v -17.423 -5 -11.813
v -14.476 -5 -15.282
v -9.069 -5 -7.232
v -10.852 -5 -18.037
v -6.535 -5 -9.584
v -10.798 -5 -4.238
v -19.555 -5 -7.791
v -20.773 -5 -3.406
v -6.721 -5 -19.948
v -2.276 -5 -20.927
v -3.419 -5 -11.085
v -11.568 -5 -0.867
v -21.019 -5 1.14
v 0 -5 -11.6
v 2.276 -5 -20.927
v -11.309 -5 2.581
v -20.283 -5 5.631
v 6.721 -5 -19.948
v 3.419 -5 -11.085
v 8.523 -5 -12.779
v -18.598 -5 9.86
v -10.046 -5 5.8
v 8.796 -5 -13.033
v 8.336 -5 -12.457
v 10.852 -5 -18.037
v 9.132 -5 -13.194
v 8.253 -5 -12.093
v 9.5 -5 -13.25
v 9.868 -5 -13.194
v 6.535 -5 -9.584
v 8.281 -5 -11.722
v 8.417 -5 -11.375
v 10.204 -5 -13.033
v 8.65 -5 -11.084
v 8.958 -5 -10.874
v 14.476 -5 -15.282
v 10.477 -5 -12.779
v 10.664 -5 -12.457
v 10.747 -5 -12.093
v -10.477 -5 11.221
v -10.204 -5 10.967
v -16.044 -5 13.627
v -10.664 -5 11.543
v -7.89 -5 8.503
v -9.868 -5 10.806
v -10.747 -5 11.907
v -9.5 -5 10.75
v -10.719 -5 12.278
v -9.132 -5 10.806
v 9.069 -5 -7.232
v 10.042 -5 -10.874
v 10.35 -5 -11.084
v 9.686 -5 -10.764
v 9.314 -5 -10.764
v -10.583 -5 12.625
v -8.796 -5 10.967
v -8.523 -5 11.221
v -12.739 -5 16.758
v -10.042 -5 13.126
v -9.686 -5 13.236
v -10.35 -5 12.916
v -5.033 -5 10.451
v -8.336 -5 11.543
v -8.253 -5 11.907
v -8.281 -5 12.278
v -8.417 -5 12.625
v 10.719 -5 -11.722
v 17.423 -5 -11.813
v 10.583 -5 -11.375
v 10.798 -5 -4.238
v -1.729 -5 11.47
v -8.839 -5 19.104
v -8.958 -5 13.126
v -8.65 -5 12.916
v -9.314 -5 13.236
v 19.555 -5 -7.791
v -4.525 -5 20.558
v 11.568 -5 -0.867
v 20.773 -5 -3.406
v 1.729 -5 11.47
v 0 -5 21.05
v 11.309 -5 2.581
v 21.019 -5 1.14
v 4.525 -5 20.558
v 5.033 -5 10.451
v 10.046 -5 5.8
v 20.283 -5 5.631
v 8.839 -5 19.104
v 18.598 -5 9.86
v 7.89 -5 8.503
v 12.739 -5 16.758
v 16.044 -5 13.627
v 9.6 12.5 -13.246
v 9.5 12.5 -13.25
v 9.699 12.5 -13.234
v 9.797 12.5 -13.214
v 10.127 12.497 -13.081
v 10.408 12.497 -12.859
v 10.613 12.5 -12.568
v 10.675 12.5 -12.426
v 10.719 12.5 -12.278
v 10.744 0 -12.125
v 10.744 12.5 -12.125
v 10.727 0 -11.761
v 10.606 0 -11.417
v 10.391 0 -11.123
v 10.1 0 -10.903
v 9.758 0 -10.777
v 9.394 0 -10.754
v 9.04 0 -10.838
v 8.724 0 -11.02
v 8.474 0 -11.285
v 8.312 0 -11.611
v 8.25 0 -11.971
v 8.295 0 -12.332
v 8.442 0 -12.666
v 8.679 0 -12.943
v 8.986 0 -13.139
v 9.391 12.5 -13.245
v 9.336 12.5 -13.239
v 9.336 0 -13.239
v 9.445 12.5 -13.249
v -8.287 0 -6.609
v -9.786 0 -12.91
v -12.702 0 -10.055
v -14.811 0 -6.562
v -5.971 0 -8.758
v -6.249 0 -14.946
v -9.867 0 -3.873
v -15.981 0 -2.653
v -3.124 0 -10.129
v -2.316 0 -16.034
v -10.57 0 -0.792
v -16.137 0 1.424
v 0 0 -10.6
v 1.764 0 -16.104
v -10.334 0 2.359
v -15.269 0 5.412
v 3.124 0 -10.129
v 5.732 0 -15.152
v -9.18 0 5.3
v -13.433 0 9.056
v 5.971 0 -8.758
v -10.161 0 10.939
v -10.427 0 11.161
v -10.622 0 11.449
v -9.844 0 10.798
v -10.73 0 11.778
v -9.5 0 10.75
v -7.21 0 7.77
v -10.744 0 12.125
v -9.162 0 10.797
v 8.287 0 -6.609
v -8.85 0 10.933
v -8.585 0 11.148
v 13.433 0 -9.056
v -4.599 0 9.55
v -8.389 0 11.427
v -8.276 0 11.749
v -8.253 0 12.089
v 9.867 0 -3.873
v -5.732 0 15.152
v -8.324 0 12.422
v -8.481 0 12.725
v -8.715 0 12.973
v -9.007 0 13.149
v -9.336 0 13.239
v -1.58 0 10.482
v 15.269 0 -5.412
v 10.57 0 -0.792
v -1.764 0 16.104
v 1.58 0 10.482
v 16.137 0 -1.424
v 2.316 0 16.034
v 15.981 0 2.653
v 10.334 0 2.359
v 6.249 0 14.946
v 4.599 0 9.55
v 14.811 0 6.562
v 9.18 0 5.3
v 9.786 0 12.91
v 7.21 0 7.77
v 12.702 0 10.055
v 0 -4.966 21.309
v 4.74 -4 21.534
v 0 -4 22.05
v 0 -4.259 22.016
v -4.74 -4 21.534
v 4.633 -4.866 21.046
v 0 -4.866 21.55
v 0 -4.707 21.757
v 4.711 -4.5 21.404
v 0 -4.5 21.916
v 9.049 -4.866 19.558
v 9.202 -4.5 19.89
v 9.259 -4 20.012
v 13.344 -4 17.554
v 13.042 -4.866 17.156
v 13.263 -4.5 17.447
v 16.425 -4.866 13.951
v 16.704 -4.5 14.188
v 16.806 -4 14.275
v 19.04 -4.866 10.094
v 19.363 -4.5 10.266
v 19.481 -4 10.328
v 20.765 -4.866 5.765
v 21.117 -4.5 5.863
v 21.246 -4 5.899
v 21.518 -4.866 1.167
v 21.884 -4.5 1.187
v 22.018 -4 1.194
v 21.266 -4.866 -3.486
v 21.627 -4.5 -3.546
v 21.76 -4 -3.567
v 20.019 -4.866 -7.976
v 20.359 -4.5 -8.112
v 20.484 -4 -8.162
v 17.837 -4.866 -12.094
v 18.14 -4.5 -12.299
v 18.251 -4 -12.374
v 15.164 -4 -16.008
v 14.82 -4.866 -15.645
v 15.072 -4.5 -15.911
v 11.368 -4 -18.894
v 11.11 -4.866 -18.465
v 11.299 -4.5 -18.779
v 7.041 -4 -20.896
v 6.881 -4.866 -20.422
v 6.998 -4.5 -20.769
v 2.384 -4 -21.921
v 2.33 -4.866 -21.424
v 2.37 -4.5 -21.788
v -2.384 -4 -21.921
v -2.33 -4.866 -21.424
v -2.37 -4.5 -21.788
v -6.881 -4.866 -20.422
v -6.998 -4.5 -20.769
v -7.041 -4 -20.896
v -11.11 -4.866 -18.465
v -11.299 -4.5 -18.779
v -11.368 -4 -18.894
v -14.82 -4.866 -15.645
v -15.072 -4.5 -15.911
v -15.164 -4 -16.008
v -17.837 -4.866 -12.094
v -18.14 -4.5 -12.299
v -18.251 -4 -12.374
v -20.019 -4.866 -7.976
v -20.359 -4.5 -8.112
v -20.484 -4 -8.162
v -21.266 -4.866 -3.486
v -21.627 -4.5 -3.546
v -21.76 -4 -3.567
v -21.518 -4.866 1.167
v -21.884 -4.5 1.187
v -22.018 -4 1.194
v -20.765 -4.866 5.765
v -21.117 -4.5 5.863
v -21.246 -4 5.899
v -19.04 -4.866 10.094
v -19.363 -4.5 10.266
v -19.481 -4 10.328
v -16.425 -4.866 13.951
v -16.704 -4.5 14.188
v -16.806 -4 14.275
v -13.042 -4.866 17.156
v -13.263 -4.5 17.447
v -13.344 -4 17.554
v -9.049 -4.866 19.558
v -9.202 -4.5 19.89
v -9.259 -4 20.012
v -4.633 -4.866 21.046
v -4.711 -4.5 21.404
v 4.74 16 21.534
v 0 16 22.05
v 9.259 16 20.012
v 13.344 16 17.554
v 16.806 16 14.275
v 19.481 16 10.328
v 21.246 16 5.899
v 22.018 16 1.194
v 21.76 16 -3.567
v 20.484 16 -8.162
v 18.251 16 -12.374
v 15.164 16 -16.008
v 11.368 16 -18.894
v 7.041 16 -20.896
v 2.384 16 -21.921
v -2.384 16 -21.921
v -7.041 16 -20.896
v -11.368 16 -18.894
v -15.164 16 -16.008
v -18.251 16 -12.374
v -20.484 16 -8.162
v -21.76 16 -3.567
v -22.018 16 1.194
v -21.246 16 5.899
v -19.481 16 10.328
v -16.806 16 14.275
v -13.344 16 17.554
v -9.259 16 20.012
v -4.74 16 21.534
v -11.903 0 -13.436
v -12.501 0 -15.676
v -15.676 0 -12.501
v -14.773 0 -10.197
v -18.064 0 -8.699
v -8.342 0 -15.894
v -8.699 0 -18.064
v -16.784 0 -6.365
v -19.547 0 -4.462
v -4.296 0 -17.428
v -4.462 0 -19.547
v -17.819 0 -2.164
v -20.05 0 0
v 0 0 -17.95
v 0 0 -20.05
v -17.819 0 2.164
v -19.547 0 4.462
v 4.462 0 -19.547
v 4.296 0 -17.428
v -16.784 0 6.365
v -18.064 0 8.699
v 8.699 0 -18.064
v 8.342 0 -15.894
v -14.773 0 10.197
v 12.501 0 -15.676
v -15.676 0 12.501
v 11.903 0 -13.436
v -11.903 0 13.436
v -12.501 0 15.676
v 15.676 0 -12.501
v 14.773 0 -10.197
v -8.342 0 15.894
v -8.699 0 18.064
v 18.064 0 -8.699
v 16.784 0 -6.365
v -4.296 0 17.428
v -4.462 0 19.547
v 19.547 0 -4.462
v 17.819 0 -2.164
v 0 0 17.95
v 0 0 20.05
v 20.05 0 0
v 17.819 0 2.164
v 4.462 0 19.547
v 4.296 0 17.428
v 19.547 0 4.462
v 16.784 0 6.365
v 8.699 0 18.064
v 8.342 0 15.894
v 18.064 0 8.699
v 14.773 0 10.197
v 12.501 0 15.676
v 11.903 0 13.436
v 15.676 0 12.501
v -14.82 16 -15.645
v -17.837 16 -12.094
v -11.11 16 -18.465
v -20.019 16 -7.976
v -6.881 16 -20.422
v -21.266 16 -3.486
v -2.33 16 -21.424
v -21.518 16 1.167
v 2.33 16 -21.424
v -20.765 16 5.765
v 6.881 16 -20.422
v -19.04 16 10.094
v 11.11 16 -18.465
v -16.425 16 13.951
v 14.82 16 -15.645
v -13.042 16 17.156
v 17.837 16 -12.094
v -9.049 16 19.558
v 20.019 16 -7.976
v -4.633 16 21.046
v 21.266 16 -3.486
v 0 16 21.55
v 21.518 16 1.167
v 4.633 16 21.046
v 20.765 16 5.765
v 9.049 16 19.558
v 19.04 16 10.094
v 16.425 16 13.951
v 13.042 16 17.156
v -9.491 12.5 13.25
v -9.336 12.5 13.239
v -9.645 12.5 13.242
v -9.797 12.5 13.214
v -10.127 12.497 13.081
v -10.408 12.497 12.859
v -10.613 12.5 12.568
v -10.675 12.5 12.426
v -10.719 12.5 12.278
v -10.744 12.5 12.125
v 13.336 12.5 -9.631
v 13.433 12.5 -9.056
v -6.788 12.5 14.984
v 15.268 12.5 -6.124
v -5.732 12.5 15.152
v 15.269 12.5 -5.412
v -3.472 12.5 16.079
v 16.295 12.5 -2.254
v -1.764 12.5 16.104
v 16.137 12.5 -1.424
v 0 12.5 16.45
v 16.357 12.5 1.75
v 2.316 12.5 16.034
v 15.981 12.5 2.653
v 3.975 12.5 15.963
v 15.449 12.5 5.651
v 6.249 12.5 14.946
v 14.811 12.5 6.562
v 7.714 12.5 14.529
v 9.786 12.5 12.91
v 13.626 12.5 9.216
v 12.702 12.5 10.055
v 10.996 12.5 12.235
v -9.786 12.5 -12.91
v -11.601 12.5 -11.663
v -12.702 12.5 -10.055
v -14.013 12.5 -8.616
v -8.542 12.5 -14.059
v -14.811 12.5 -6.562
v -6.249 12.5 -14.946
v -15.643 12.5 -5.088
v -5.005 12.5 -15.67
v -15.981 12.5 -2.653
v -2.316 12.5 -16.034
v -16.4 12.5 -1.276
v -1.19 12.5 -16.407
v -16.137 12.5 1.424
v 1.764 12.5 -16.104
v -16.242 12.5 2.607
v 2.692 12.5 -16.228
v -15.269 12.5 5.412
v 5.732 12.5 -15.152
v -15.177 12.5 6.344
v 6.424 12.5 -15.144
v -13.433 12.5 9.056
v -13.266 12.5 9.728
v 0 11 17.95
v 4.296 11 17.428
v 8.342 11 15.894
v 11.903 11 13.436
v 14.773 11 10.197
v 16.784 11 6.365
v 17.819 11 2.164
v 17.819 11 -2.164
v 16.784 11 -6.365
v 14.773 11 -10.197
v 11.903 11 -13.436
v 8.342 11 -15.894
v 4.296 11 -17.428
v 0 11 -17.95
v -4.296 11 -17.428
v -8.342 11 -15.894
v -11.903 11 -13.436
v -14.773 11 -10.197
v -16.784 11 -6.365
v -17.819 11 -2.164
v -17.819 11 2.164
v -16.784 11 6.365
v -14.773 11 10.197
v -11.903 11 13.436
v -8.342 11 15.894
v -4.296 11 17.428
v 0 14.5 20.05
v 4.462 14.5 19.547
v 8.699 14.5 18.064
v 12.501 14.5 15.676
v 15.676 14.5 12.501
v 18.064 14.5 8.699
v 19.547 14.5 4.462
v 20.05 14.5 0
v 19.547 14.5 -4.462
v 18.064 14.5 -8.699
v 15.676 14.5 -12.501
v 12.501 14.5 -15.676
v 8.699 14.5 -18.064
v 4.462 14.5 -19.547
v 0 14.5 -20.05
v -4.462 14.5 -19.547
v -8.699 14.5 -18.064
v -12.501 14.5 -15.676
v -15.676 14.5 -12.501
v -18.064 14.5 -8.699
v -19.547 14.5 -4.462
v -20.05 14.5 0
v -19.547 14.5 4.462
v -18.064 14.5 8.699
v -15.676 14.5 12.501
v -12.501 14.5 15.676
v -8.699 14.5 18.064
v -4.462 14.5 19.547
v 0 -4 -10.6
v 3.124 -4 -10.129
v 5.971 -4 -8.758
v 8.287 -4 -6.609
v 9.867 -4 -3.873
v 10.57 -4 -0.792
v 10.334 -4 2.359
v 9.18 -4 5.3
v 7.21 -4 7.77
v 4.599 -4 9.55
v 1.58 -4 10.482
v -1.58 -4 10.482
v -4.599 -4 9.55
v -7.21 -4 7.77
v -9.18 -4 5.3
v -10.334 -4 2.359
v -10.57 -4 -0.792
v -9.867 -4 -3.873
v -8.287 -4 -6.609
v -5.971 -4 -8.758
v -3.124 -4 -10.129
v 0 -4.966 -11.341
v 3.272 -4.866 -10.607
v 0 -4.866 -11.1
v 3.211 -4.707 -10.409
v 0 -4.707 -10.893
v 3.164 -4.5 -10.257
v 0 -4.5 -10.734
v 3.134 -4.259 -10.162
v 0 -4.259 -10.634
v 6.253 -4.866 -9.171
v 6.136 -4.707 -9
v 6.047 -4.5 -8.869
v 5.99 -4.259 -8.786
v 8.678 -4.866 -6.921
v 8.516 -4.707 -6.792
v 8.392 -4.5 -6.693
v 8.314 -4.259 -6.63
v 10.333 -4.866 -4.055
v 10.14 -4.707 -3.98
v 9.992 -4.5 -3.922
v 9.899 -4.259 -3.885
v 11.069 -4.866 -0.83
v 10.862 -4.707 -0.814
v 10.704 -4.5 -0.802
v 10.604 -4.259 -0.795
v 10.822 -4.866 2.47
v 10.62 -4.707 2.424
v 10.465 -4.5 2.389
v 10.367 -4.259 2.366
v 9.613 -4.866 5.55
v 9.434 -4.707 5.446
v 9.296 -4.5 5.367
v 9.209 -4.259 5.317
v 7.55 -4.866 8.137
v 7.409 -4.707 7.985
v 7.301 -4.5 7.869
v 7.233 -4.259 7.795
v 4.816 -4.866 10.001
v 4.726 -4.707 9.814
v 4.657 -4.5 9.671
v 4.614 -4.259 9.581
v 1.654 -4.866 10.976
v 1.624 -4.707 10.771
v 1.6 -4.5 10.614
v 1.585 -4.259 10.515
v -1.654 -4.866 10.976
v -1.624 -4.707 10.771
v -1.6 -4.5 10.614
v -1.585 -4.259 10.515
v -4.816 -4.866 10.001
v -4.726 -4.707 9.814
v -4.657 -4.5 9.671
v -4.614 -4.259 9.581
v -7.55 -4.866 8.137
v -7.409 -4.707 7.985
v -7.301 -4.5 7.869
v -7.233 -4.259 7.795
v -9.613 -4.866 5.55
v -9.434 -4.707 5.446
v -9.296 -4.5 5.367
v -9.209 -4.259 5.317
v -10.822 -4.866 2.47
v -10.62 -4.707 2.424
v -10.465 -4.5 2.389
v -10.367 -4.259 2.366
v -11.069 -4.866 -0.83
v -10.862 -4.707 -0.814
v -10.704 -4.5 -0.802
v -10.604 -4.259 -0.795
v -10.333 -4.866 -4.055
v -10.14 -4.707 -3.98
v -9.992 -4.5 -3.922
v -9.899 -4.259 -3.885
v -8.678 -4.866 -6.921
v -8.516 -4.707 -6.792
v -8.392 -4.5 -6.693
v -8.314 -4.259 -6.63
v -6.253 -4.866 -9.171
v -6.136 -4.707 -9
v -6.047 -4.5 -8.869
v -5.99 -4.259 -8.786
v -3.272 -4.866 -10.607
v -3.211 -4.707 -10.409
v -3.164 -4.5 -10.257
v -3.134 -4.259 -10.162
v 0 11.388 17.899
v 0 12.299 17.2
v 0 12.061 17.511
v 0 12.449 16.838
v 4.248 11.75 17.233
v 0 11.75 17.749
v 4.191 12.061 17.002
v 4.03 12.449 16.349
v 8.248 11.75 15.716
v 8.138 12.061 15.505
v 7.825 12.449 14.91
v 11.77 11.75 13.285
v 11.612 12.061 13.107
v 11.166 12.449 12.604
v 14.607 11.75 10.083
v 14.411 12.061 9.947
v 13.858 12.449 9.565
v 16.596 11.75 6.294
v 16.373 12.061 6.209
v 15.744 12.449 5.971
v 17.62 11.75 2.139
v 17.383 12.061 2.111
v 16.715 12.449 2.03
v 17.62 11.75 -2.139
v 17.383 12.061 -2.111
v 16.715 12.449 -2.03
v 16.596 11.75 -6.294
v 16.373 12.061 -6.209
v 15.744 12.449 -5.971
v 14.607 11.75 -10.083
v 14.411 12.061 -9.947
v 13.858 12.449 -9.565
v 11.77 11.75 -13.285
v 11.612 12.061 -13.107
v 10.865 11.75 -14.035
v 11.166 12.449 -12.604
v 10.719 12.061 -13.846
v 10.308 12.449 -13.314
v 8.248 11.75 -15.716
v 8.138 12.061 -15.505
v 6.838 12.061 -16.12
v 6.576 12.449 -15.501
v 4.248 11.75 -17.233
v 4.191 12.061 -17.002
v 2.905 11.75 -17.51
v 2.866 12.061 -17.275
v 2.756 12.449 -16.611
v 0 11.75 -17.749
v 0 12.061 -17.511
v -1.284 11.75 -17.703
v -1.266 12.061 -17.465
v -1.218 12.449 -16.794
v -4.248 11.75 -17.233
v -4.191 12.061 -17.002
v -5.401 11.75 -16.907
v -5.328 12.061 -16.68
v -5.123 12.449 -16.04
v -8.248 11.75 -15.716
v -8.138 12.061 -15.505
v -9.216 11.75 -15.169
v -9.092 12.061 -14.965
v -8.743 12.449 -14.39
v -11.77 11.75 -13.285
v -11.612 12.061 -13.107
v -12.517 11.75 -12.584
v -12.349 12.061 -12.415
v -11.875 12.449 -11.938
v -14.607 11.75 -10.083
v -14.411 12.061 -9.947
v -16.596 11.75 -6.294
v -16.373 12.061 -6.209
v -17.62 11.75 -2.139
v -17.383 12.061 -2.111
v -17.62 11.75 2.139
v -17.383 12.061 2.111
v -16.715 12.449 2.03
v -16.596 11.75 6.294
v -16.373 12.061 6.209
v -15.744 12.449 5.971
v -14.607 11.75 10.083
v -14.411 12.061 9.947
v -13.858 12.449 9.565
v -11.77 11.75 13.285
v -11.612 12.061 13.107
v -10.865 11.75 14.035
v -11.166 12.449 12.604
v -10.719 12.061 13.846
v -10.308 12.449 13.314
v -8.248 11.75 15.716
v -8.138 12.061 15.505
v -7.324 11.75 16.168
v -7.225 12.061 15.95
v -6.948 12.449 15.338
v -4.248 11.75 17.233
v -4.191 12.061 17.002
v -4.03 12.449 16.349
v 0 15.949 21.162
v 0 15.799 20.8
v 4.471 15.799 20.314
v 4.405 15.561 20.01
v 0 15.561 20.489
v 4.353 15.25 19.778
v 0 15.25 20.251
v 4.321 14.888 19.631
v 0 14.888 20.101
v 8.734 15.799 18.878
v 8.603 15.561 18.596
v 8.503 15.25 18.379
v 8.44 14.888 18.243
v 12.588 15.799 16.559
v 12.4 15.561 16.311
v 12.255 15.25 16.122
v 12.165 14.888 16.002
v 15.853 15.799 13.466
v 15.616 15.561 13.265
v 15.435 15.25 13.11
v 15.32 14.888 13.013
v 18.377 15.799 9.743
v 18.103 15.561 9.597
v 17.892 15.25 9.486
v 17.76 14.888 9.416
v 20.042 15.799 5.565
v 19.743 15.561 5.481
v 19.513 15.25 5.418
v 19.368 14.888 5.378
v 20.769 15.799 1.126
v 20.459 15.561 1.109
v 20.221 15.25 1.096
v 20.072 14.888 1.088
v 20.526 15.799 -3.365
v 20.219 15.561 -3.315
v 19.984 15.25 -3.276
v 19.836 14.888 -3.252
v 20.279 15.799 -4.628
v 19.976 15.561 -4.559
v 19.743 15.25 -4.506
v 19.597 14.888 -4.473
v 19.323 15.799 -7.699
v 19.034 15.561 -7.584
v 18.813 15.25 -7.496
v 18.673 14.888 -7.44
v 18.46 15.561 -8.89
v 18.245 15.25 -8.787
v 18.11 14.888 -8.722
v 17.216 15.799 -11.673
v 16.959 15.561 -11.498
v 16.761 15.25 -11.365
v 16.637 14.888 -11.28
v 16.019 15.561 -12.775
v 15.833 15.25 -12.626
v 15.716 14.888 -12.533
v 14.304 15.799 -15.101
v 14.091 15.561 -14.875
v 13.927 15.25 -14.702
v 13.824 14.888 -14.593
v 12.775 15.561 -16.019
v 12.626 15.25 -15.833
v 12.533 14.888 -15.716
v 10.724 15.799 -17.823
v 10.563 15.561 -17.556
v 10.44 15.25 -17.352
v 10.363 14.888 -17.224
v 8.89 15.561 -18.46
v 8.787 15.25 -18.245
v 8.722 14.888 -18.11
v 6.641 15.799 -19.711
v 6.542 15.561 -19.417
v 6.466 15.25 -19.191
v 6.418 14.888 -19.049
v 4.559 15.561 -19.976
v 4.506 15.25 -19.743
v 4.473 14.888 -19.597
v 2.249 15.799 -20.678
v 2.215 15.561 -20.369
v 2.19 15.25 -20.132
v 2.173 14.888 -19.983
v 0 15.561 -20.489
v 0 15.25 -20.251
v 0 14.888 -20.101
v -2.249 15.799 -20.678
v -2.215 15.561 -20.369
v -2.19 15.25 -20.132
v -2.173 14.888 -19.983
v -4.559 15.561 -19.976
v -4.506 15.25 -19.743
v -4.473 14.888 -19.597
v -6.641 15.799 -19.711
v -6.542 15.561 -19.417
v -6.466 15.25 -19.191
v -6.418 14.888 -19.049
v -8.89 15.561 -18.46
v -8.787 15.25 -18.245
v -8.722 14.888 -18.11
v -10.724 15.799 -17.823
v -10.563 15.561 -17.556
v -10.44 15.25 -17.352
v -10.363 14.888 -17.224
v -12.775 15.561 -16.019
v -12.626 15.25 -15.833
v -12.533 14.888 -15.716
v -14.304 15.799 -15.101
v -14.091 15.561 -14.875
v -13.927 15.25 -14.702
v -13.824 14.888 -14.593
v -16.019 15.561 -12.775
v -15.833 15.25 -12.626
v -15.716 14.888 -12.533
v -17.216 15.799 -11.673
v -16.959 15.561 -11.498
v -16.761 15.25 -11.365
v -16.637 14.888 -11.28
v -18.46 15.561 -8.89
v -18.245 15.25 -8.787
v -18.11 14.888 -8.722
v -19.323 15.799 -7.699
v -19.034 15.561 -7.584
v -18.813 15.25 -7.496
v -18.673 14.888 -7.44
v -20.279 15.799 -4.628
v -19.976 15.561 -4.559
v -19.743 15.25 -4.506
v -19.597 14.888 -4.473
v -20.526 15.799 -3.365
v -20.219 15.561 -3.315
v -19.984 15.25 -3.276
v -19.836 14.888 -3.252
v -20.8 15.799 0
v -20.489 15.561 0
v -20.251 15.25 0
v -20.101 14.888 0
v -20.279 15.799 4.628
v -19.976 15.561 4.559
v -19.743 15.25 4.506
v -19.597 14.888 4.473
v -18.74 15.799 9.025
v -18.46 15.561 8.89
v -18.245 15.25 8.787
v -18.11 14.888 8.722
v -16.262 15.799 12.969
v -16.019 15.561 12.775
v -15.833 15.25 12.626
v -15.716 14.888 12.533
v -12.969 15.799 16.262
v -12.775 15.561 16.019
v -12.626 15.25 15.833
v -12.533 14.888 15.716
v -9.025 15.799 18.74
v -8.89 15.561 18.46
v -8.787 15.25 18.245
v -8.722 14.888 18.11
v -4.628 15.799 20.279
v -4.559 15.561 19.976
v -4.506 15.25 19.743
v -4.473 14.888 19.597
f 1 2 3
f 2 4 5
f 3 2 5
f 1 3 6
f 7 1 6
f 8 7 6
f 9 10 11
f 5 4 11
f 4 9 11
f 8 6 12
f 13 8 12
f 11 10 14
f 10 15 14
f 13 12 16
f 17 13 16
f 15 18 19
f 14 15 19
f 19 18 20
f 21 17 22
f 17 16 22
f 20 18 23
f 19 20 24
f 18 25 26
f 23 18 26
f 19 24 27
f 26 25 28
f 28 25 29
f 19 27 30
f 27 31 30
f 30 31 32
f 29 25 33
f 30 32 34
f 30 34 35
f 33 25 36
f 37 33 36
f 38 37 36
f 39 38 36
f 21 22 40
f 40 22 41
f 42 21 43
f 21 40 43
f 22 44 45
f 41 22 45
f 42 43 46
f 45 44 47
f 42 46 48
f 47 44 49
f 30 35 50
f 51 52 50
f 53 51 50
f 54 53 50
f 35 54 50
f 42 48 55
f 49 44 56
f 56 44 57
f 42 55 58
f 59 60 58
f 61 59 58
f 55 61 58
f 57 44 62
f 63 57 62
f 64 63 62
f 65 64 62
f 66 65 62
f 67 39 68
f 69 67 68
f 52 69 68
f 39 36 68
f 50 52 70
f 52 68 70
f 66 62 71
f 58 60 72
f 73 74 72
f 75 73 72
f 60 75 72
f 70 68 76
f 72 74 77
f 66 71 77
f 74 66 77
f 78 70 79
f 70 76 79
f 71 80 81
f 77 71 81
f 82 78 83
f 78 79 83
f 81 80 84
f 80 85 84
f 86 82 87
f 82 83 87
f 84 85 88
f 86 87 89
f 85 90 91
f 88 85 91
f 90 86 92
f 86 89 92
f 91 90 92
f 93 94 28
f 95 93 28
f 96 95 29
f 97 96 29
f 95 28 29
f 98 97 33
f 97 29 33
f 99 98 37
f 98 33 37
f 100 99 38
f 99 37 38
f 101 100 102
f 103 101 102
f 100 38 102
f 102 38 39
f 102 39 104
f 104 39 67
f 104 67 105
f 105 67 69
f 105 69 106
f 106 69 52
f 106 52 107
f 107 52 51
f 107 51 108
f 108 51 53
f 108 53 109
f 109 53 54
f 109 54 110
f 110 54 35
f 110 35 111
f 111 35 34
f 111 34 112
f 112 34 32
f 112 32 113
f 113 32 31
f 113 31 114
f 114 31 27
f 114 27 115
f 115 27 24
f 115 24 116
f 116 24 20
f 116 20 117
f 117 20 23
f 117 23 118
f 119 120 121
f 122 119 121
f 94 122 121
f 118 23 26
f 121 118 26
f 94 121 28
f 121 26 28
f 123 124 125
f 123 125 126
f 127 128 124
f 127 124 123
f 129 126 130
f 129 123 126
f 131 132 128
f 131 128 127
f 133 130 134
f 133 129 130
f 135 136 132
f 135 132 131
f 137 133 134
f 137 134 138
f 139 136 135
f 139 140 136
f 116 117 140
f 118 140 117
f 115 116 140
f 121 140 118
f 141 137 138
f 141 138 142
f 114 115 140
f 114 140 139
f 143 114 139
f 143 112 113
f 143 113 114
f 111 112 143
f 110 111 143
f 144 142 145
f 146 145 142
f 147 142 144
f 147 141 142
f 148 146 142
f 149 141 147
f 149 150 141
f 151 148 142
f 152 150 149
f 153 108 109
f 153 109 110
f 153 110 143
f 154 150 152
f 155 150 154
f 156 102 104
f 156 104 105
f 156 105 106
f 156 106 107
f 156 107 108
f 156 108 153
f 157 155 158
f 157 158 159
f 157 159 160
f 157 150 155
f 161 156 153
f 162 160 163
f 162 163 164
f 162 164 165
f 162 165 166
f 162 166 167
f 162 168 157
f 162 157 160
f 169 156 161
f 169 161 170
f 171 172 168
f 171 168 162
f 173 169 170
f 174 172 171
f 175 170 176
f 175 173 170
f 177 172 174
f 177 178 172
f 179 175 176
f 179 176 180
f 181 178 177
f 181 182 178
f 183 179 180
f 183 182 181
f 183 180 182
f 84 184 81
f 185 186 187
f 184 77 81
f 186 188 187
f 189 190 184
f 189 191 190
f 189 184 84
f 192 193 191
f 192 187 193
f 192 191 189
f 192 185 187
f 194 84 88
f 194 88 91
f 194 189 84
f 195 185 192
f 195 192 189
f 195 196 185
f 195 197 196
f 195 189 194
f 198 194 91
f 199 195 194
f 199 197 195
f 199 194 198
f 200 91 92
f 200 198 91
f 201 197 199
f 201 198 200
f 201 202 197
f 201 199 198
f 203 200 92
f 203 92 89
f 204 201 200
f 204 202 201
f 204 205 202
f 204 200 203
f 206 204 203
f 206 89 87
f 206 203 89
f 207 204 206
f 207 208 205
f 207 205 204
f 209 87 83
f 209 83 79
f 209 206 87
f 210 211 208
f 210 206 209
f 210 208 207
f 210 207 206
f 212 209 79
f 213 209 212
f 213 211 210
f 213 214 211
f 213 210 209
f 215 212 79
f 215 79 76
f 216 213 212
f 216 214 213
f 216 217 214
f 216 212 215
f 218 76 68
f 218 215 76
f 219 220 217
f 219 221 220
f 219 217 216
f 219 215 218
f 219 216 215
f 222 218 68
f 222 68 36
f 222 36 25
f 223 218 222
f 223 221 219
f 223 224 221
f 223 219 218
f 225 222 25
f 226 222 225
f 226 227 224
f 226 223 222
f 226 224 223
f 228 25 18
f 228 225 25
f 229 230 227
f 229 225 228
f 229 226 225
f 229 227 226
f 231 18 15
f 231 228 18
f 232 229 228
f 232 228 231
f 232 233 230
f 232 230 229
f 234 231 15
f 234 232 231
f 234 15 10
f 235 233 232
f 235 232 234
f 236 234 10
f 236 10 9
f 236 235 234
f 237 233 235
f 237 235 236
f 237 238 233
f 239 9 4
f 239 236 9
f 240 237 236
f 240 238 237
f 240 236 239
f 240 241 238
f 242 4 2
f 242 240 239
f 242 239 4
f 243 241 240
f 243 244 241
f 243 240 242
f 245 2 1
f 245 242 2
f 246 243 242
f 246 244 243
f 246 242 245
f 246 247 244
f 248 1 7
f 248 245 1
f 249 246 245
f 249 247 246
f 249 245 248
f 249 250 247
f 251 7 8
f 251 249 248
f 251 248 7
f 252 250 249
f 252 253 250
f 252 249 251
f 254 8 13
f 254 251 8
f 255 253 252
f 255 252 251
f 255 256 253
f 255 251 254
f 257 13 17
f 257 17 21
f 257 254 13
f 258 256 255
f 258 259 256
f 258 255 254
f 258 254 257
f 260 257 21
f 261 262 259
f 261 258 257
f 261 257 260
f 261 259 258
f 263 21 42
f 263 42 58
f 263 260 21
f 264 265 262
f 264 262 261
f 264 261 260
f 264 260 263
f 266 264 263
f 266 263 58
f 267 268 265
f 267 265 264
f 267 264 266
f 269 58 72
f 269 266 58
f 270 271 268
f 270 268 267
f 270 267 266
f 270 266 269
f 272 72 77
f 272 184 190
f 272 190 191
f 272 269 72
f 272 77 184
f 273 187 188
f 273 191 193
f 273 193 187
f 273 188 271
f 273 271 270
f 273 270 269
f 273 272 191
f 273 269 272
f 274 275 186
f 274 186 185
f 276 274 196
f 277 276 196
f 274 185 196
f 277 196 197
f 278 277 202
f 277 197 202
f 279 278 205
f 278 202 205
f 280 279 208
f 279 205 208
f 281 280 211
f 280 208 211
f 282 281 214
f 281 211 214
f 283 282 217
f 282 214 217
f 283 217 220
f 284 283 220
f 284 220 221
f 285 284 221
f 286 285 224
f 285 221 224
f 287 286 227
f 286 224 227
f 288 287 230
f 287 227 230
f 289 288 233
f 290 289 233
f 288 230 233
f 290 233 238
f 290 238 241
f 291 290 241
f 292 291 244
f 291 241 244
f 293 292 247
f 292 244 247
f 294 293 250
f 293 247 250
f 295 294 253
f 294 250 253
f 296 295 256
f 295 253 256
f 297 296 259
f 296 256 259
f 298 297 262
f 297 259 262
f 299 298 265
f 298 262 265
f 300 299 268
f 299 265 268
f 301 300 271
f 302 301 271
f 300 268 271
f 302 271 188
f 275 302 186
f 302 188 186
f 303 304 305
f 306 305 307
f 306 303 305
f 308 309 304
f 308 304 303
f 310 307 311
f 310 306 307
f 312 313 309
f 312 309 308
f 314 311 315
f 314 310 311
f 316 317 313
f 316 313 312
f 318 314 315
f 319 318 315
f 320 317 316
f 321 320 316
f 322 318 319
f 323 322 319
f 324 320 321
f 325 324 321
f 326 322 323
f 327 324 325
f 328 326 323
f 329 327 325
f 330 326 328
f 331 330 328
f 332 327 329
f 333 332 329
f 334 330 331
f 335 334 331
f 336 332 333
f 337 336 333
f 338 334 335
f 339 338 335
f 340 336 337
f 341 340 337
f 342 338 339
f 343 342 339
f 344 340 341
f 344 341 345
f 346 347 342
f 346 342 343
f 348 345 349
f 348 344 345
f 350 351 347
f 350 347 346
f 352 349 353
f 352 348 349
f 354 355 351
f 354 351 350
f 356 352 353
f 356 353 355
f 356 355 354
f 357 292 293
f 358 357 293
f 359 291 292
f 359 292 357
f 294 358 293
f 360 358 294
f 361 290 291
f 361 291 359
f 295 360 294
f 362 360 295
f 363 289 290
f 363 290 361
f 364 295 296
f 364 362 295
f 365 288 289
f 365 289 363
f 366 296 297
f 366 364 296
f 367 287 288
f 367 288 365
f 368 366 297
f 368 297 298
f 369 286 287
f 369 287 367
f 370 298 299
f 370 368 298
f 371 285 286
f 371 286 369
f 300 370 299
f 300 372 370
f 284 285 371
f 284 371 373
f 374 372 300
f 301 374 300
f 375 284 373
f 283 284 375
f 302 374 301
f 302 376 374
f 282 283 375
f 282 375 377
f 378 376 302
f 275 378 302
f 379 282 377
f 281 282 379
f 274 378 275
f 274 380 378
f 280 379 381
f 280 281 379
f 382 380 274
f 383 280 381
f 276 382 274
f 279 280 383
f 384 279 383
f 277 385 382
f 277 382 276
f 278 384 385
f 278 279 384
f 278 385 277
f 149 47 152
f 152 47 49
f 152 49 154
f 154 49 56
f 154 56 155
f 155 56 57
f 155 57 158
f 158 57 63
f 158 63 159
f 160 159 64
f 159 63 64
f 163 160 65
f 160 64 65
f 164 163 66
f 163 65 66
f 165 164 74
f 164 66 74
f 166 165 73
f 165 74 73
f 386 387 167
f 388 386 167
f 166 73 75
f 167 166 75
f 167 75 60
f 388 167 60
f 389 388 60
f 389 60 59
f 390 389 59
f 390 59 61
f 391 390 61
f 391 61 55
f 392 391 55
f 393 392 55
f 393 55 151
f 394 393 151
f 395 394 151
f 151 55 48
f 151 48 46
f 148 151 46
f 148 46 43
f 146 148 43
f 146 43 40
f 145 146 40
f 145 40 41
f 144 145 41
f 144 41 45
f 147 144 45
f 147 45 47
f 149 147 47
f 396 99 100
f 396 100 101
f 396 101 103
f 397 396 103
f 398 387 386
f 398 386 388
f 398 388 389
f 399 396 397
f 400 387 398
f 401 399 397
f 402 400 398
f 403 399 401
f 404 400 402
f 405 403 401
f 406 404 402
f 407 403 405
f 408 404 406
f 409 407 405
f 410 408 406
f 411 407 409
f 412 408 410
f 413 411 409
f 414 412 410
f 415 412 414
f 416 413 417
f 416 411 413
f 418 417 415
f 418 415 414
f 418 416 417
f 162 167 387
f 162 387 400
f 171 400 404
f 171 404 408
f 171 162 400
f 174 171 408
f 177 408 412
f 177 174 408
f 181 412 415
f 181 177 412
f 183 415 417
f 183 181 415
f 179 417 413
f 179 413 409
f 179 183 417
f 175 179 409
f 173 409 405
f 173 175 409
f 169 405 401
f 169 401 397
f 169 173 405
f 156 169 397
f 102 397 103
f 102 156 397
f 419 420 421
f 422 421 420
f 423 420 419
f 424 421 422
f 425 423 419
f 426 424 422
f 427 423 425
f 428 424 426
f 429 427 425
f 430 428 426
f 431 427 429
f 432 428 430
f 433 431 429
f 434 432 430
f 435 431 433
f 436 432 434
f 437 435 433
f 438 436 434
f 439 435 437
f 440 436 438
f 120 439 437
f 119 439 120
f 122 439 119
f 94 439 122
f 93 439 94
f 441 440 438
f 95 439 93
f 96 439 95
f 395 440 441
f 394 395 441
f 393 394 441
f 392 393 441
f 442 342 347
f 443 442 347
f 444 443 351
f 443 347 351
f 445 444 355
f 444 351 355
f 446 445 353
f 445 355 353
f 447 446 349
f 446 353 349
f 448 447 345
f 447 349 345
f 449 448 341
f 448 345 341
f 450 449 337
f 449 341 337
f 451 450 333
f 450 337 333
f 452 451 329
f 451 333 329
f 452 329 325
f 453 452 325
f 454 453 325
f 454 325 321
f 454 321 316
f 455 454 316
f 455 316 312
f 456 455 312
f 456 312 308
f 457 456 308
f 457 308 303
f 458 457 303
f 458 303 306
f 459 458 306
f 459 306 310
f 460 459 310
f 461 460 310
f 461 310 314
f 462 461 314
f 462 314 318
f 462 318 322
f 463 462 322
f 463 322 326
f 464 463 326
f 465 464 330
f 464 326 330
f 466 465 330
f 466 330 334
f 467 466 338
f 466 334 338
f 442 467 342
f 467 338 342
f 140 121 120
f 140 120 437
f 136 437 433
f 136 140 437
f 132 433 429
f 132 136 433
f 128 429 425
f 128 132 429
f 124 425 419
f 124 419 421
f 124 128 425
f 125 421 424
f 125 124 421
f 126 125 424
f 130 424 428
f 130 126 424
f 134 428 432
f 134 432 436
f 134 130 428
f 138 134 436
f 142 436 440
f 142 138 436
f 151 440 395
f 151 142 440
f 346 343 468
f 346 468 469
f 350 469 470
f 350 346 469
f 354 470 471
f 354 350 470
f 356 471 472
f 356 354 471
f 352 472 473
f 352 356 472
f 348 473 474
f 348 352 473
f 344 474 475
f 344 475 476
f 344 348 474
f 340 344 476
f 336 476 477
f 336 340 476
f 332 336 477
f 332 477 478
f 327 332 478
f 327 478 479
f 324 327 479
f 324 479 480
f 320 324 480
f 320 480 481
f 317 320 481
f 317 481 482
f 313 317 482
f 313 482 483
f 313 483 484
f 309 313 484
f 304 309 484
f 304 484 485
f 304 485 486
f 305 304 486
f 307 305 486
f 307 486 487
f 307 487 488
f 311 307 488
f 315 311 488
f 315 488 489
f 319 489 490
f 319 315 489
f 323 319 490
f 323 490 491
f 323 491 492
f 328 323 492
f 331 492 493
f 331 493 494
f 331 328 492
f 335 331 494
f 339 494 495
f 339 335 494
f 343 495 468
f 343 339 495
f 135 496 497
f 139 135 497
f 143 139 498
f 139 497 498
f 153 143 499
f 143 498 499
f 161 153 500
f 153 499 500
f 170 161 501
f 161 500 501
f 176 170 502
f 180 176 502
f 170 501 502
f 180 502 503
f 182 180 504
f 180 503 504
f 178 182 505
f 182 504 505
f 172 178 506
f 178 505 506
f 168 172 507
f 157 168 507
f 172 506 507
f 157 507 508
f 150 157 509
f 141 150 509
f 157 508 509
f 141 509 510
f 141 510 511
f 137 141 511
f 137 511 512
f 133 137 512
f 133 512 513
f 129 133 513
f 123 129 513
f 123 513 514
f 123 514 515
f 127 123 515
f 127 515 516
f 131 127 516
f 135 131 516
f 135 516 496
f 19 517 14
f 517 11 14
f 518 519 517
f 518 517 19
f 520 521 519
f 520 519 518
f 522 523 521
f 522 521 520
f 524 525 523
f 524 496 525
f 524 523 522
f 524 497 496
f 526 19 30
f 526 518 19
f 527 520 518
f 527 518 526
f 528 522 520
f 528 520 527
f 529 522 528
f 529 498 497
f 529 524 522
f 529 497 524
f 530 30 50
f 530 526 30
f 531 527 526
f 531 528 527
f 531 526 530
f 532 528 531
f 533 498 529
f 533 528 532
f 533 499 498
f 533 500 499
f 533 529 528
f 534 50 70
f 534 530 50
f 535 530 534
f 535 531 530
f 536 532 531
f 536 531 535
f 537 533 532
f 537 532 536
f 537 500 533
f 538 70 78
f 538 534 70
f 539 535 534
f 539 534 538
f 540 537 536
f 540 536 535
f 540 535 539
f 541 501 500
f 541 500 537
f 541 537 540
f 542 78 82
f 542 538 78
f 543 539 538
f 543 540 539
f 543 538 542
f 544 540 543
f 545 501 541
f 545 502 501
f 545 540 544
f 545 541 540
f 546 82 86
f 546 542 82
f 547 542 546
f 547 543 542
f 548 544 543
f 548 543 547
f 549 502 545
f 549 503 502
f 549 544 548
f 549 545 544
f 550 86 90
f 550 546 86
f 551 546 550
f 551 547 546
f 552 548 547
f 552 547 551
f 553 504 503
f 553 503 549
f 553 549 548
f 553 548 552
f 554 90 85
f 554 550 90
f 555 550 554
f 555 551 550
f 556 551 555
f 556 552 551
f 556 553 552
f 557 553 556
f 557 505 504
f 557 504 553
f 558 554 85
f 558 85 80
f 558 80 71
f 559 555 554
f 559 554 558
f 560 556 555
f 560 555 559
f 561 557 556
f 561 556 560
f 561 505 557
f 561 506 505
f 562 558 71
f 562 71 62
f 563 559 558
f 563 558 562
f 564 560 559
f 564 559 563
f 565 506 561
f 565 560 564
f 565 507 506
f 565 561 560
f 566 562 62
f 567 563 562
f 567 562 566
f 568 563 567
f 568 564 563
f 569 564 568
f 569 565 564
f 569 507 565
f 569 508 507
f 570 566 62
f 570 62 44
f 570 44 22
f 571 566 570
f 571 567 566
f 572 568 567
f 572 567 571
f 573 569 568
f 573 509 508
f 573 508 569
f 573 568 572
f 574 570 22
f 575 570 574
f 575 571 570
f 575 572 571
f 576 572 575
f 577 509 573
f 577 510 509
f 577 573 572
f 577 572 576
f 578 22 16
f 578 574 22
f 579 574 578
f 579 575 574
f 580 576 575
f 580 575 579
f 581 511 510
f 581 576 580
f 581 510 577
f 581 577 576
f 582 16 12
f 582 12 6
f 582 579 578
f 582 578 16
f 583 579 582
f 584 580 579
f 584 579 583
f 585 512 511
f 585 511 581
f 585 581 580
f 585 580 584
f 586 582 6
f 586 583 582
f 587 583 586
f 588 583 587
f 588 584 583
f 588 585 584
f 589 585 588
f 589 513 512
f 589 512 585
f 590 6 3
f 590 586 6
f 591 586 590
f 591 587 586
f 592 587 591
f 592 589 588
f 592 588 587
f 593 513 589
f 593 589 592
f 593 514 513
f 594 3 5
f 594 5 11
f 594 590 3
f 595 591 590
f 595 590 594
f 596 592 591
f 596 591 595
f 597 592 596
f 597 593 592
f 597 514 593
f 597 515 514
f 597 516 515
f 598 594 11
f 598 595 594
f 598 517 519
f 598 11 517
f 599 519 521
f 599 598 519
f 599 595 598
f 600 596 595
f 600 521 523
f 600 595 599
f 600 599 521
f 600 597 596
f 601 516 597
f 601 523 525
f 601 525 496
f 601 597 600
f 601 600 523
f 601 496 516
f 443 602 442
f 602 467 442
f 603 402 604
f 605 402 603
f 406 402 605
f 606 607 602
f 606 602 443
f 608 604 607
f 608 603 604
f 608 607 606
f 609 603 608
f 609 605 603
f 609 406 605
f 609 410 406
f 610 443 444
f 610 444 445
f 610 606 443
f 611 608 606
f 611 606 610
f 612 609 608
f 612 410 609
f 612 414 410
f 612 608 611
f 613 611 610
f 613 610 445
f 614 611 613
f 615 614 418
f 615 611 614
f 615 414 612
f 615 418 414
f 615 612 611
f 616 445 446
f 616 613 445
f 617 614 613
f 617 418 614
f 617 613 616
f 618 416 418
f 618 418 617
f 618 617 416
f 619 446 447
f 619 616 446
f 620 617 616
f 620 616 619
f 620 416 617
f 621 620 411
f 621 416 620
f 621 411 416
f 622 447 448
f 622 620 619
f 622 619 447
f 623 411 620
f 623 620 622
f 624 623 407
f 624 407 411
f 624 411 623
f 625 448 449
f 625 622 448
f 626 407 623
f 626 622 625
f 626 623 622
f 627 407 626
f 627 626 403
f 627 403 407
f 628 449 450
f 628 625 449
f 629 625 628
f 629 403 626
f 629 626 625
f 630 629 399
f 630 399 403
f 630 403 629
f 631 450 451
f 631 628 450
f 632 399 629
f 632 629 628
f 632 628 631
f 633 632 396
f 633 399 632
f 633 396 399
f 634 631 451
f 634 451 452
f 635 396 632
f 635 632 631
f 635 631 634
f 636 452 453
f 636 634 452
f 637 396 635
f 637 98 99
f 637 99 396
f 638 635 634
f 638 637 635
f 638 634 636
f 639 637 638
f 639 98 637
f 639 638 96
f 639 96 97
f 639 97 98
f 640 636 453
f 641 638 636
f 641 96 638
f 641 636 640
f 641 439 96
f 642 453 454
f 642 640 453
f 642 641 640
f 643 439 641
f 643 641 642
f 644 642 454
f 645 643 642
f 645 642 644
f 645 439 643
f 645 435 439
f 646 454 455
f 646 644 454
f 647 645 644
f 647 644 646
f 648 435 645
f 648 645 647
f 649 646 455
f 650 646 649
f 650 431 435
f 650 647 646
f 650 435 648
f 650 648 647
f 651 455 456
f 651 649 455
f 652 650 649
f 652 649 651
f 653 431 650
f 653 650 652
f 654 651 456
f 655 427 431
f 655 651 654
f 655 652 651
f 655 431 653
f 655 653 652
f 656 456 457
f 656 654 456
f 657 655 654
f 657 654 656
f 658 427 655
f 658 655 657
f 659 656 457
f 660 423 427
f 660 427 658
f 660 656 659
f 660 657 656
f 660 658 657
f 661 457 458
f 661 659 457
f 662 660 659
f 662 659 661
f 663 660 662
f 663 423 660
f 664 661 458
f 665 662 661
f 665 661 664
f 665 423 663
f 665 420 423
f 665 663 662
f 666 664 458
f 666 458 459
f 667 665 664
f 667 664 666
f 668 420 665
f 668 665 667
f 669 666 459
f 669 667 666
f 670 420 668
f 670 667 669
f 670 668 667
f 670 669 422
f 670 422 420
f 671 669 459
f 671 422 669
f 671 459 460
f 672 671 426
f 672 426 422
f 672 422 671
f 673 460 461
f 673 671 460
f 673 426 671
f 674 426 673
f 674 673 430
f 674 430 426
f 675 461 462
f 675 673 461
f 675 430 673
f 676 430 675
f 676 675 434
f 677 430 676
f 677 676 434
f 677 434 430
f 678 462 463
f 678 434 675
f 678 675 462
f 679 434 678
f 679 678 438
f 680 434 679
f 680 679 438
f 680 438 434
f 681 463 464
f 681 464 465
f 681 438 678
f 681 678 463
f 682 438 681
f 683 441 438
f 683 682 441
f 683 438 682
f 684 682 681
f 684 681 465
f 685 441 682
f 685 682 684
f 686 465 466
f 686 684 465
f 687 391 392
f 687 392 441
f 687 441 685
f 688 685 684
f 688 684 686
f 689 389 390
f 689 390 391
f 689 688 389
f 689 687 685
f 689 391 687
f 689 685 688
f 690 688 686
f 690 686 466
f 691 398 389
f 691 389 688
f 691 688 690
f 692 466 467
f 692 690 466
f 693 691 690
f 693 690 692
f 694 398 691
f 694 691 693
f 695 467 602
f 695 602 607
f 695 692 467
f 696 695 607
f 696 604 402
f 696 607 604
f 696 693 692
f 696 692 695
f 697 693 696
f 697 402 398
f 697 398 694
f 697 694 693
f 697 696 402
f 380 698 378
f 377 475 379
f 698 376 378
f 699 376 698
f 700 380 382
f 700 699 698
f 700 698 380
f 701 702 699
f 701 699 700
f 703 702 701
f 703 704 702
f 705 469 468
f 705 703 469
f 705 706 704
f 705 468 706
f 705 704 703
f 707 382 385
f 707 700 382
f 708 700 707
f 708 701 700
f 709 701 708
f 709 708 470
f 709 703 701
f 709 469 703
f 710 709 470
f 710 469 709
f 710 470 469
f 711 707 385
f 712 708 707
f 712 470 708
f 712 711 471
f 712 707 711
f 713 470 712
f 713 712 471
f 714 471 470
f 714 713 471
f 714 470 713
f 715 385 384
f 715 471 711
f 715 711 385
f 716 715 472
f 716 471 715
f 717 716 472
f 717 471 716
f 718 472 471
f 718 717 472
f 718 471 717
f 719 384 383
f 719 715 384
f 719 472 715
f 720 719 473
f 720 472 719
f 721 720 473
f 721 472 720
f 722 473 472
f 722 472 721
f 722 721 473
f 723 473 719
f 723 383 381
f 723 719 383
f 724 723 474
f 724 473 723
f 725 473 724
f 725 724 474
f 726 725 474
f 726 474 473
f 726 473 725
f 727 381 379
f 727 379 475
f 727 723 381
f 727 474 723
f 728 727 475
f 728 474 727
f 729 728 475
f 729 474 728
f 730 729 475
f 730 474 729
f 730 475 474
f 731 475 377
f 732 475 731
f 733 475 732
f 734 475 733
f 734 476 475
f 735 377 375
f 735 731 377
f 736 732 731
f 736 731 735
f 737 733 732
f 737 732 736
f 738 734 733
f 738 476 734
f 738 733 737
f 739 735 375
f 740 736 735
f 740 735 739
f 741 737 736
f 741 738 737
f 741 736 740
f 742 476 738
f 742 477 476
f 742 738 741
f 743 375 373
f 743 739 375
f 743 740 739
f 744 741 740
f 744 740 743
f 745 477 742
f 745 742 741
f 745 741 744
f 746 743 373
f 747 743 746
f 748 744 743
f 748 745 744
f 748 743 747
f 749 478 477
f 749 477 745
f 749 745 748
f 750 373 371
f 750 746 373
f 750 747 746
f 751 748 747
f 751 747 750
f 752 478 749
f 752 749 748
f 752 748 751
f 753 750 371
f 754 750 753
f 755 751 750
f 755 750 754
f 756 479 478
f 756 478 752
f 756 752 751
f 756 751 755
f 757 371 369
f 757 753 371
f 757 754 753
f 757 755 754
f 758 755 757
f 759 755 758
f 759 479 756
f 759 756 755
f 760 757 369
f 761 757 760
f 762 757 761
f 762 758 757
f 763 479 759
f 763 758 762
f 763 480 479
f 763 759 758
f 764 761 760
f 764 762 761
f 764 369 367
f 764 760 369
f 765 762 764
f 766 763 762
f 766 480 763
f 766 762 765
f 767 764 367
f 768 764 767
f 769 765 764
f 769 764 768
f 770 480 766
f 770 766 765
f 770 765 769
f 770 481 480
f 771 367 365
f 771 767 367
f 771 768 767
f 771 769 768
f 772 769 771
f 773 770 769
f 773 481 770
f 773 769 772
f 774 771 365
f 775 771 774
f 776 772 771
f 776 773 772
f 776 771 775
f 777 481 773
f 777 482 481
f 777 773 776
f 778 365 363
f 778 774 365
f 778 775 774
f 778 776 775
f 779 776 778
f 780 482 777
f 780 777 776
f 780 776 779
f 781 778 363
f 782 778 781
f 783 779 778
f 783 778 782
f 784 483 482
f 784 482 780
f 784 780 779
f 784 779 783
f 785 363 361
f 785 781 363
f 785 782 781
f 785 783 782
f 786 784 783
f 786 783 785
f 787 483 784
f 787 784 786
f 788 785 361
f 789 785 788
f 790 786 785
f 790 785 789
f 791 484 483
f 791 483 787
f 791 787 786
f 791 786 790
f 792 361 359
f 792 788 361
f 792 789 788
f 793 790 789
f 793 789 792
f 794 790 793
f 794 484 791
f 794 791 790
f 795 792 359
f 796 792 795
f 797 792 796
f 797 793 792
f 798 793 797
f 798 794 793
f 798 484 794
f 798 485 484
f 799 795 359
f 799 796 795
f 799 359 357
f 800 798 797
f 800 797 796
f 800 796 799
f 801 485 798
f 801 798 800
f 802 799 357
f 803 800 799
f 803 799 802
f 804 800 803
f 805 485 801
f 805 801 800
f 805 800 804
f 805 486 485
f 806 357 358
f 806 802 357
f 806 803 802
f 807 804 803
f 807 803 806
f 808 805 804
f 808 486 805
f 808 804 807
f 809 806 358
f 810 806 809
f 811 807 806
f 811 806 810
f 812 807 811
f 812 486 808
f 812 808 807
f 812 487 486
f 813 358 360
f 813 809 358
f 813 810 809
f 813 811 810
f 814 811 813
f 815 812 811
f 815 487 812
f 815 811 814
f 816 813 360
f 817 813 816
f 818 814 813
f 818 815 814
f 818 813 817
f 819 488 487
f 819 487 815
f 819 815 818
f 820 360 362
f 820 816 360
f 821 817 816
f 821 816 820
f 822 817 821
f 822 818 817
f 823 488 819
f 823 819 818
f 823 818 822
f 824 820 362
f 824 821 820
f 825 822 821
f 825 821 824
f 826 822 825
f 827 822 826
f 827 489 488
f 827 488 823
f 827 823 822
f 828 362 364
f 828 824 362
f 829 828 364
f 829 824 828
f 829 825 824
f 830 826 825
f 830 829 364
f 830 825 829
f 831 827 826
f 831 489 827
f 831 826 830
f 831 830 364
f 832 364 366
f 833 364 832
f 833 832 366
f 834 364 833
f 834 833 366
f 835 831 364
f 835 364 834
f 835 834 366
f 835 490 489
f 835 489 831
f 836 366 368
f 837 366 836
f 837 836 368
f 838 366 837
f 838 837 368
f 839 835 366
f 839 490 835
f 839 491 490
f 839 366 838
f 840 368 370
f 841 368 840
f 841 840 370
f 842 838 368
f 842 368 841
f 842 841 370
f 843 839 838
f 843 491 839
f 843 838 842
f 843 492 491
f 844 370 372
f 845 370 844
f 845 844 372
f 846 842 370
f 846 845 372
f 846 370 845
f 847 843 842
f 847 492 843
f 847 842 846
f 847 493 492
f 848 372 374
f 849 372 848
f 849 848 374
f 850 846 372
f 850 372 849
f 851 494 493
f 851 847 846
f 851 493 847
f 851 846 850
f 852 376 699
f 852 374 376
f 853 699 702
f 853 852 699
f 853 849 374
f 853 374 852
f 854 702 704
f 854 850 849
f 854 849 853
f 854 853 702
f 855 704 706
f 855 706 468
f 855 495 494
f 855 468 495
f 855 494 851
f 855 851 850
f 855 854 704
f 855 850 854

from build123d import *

# Parameters (mm, degrees)
CROQUIS1_R              = 22.05
CROQUIS1_R_2            = 20.05
SALIENTE_EXTRUIR1_DEPTH = 16
CROQUIS1_4_R            = 17.95
CROQUIS1_4_R_2          = 16.2
SALIENTE_EXTRUIR2_DEPTH = 12.5
SALIENTE_EXTRUIR4_START = -5
CROQUIS1_6_R            = 22.05
CROQUIS1_6_R_2          = 20.05
CROQUIS1_6_R_3          = 17.95
CROQUIS1_6_R_4          = 16.2
SALIENTE_EXTRUIR4_DEPTH = 5
CORTAR_EXTRUIR1_REACH   = 39.595
CROQUIS4_R              = 10.6
CROQUIS4_R_2            = 1.25
REDONDEO1_R             = 1
REDONDEO2_R             = 1.5
REDONDEO3_R             = 1


with BuildPart() as part:
    # Croquis1 → Saliente-Extruir1 (new body)
    with BuildSketch(Plane(origin=(0, 0, 0), x_dir=(1, 0, 0), z_dir=(0, 1, 0))):
        with Locations(Location((0, 0, 0), (0, 0, 270))):
            Circle(CROQUIS1_R)
        with Locations(Location((0, 0, 0), (0, 0, 270))):
            Circle(CROQUIS1_R_2, mode=Mode.SUBTRACT)
    extrude(amount=SALIENTE_EXTRUIR1_DEPTH)



with BuildPart() as body_2:
    # Croquis1<4> → Saliente-Extruir2 (new body)
    with BuildSketch(Plane(origin=(0, 0, 0), x_dir=(1, 0, 0), z_dir=(0, 1, 0))):
        with Locations(Location((0, 0, 0), (0, 0, 270))):
            Circle(CROQUIS1_4_R)
        with Locations(Location((0, 0, 0), (0, 0, 270))):
            Circle(CROQUIS1_4_R_2, mode=Mode.SUBTRACT)
    extrude(amount=SALIENTE_EXTRUIR2_DEPTH)


with BuildPart() as part_1:
    add(part.part)

    add(body_2.part)  # Saliente-Extruir4 merges body 2
    # Croquis1<6> → Saliente-Extruir4 (add)
    # profile 1 of 4: a face of its own
    with BuildSketch(Plane(origin=(0, 0, 0), x_dir=(1, 0, 0), z_dir=(0, 1, 0)).offset(SALIENTE_EXTRUIR4_START)):
        with Locations(Location((0, 0, 0), (0, 0, 270))):
            Circle(CROQUIS1_6_R)
        with Locations(Location((0, 0, 0), (0, 0, 270))):
            Circle(CROQUIS1_6_R_2, mode=Mode.SUBTRACT)
    # profile 2 of 4: a face of its own
    with BuildSketch(Plane(origin=(0, 0, 0), x_dir=(1, 0, 0), z_dir=(0, 1, 0)).offset(SALIENTE_EXTRUIR4_START)):
        with Locations(Location((0, 0, 0), (0, 0, 270))):
            Circle(CROQUIS1_6_R_2)
        with Locations(Location((0, 0, 0), (0, 0, 270))):
            Circle(CROQUIS1_6_R_3, mode=Mode.SUBTRACT)
    # profile 3 of 4: a face of its own
    with BuildSketch(Plane(origin=(0, 0, 0), x_dir=(1, 0, 0), z_dir=(0, 1, 0)).offset(SALIENTE_EXTRUIR4_START)):
        with Locations(Location((0, 0, 0), (0, 0, 270))):
            Circle(CROQUIS1_6_R_3)
        with Locations(Location((0, 0, 0), (0, 0, 270))):
            Circle(CROQUIS1_6_R_4, mode=Mode.SUBTRACT)
    # profile 4 of 4: a face of its own
    with BuildSketch(Plane(origin=(0, 0, 0), x_dir=(1, 0, 0), z_dir=(0, 1, 0)).offset(SALIENTE_EXTRUIR4_START)):
        with Locations(Location((0, 0, 0), (0, 0, 270))):
            Circle(CROQUIS1_6_R_4)
    extrude(amount=SALIENTE_EXTRUIR4_DEPTH)

    # Croquis4 → Cortar-Extruir1 (cut, up to next)
    with BuildSketch(Plane.XZ.offset(5), mode=Mode.PRIVATE) as cortar_extruir1_sk1:
        with Locations(Location((0, 0, 0), (0, 0, 270))):
            Circle(CROQUIS4_R)
    cortar_extruir1_tool1 = extrude(cortar_extruir1_sk1.sketch, amount=-CORTAR_EXTRUIR1_REACH, mode=Mode.PRIVATE) & part_1.part
    # Croquis4 → Cortar-Extruir1 (cut, up to next)
    with BuildSketch(Plane.XZ.offset(5), mode=Mode.PRIVATE) as cortar_extruir1_sk2:
        with Locations(Location((-9.5, 12, 0), (0, 0, 270))):
            Circle(CROQUIS4_R_2)
    cortar_extruir1_tool2 = extrude(cortar_extruir1_sk2.sketch, amount=-CORTAR_EXTRUIR1_REACH, mode=Mode.PRIVATE) & part_1.part
    # Croquis4 → Cortar-Extruir1 (cut, up to next)
    with BuildSketch(Plane.XZ.offset(5), mode=Mode.PRIVATE) as cortar_extruir1_sk3:
        with Locations(Location((9.5, -12, 0), (0, 0, 270))):
            Circle(CROQUIS4_R_2)
    cortar_extruir1_tool3 = extrude(cortar_extruir1_sk3.sketch, amount=-CORTAR_EXTRUIR1_REACH, mode=Mode.PRIVATE) & part_1.part
    add(cortar_extruir1_tool1.solids().sort_by_distance((0, -5, 0))[0], mode=Mode.SUBTRACT)
    add(cortar_extruir1_tool2.solids().sort_by_distance((-9.5, -5, 12))[0], mode=Mode.SUBTRACT)
    add(cortar_extruir1_tool3.solids().sort_by_distance((9.5, -5, -12))[0], mode=Mode.SUBTRACT)

    # Redondeo1
    redondeo1_edges = [part_1.edges().sort_by_distance(p)[0] for p in [
        (0, -5, 10.6),
    ]]
    fillet(redondeo1_edges, radius=REDONDEO1_R)

    # Redondeo2
    # the kernel refuses this fillet: 1.5 mm, written as the material it takes off along each edge
    with BuildSketch(Plane(origin=(0, 12.5, 0), x_dir=(0, 0, 1), z_dir=(-1, 0, 0))) as redondeo2_piece_1:
        with BuildLine():
            CenterArc((17.95 - REDONDEO2_R, -REDONDEO2_R), REDONDEO2_R, 0, 90)
            Line((17.95, -REDONDEO2_R), (17.95, 0))
            Line((17.95, 0), (17.95 - REDONDEO2_R, 0))
        make_face()
    revolve(axis=Axis((0, 12.5, 0), (0, 1, 0)), mode=Mode.SUBTRACT)
    with BuildSketch(Plane(origin=(0, 16, 0), x_dir=(0, 0, 1), z_dir=(-1, 0, 0))) as redondeo2_piece_2:
        with BuildLine():
            CenterArc((20.05 + REDONDEO2_R, -REDONDEO2_R), REDONDEO2_R, 90, 90)
            Line((20.05, -REDONDEO2_R), (20.05, 0))
            Line((20.05, 0), (20.05 + REDONDEO2_R, 0))
        make_face()
    revolve(axis=Axis((0, 16, 0), (0, 1, 0)), mode=Mode.SUBTRACT)

    # Redondeo3
    redondeo3_edges = [part_1.edges().sort_by_distance(p)[0] for p in [
        (0, -5, -22.05),
    ]]
    fillet(redondeo3_edges, radius=REDONDEO3_R)


solid = part_1.part
